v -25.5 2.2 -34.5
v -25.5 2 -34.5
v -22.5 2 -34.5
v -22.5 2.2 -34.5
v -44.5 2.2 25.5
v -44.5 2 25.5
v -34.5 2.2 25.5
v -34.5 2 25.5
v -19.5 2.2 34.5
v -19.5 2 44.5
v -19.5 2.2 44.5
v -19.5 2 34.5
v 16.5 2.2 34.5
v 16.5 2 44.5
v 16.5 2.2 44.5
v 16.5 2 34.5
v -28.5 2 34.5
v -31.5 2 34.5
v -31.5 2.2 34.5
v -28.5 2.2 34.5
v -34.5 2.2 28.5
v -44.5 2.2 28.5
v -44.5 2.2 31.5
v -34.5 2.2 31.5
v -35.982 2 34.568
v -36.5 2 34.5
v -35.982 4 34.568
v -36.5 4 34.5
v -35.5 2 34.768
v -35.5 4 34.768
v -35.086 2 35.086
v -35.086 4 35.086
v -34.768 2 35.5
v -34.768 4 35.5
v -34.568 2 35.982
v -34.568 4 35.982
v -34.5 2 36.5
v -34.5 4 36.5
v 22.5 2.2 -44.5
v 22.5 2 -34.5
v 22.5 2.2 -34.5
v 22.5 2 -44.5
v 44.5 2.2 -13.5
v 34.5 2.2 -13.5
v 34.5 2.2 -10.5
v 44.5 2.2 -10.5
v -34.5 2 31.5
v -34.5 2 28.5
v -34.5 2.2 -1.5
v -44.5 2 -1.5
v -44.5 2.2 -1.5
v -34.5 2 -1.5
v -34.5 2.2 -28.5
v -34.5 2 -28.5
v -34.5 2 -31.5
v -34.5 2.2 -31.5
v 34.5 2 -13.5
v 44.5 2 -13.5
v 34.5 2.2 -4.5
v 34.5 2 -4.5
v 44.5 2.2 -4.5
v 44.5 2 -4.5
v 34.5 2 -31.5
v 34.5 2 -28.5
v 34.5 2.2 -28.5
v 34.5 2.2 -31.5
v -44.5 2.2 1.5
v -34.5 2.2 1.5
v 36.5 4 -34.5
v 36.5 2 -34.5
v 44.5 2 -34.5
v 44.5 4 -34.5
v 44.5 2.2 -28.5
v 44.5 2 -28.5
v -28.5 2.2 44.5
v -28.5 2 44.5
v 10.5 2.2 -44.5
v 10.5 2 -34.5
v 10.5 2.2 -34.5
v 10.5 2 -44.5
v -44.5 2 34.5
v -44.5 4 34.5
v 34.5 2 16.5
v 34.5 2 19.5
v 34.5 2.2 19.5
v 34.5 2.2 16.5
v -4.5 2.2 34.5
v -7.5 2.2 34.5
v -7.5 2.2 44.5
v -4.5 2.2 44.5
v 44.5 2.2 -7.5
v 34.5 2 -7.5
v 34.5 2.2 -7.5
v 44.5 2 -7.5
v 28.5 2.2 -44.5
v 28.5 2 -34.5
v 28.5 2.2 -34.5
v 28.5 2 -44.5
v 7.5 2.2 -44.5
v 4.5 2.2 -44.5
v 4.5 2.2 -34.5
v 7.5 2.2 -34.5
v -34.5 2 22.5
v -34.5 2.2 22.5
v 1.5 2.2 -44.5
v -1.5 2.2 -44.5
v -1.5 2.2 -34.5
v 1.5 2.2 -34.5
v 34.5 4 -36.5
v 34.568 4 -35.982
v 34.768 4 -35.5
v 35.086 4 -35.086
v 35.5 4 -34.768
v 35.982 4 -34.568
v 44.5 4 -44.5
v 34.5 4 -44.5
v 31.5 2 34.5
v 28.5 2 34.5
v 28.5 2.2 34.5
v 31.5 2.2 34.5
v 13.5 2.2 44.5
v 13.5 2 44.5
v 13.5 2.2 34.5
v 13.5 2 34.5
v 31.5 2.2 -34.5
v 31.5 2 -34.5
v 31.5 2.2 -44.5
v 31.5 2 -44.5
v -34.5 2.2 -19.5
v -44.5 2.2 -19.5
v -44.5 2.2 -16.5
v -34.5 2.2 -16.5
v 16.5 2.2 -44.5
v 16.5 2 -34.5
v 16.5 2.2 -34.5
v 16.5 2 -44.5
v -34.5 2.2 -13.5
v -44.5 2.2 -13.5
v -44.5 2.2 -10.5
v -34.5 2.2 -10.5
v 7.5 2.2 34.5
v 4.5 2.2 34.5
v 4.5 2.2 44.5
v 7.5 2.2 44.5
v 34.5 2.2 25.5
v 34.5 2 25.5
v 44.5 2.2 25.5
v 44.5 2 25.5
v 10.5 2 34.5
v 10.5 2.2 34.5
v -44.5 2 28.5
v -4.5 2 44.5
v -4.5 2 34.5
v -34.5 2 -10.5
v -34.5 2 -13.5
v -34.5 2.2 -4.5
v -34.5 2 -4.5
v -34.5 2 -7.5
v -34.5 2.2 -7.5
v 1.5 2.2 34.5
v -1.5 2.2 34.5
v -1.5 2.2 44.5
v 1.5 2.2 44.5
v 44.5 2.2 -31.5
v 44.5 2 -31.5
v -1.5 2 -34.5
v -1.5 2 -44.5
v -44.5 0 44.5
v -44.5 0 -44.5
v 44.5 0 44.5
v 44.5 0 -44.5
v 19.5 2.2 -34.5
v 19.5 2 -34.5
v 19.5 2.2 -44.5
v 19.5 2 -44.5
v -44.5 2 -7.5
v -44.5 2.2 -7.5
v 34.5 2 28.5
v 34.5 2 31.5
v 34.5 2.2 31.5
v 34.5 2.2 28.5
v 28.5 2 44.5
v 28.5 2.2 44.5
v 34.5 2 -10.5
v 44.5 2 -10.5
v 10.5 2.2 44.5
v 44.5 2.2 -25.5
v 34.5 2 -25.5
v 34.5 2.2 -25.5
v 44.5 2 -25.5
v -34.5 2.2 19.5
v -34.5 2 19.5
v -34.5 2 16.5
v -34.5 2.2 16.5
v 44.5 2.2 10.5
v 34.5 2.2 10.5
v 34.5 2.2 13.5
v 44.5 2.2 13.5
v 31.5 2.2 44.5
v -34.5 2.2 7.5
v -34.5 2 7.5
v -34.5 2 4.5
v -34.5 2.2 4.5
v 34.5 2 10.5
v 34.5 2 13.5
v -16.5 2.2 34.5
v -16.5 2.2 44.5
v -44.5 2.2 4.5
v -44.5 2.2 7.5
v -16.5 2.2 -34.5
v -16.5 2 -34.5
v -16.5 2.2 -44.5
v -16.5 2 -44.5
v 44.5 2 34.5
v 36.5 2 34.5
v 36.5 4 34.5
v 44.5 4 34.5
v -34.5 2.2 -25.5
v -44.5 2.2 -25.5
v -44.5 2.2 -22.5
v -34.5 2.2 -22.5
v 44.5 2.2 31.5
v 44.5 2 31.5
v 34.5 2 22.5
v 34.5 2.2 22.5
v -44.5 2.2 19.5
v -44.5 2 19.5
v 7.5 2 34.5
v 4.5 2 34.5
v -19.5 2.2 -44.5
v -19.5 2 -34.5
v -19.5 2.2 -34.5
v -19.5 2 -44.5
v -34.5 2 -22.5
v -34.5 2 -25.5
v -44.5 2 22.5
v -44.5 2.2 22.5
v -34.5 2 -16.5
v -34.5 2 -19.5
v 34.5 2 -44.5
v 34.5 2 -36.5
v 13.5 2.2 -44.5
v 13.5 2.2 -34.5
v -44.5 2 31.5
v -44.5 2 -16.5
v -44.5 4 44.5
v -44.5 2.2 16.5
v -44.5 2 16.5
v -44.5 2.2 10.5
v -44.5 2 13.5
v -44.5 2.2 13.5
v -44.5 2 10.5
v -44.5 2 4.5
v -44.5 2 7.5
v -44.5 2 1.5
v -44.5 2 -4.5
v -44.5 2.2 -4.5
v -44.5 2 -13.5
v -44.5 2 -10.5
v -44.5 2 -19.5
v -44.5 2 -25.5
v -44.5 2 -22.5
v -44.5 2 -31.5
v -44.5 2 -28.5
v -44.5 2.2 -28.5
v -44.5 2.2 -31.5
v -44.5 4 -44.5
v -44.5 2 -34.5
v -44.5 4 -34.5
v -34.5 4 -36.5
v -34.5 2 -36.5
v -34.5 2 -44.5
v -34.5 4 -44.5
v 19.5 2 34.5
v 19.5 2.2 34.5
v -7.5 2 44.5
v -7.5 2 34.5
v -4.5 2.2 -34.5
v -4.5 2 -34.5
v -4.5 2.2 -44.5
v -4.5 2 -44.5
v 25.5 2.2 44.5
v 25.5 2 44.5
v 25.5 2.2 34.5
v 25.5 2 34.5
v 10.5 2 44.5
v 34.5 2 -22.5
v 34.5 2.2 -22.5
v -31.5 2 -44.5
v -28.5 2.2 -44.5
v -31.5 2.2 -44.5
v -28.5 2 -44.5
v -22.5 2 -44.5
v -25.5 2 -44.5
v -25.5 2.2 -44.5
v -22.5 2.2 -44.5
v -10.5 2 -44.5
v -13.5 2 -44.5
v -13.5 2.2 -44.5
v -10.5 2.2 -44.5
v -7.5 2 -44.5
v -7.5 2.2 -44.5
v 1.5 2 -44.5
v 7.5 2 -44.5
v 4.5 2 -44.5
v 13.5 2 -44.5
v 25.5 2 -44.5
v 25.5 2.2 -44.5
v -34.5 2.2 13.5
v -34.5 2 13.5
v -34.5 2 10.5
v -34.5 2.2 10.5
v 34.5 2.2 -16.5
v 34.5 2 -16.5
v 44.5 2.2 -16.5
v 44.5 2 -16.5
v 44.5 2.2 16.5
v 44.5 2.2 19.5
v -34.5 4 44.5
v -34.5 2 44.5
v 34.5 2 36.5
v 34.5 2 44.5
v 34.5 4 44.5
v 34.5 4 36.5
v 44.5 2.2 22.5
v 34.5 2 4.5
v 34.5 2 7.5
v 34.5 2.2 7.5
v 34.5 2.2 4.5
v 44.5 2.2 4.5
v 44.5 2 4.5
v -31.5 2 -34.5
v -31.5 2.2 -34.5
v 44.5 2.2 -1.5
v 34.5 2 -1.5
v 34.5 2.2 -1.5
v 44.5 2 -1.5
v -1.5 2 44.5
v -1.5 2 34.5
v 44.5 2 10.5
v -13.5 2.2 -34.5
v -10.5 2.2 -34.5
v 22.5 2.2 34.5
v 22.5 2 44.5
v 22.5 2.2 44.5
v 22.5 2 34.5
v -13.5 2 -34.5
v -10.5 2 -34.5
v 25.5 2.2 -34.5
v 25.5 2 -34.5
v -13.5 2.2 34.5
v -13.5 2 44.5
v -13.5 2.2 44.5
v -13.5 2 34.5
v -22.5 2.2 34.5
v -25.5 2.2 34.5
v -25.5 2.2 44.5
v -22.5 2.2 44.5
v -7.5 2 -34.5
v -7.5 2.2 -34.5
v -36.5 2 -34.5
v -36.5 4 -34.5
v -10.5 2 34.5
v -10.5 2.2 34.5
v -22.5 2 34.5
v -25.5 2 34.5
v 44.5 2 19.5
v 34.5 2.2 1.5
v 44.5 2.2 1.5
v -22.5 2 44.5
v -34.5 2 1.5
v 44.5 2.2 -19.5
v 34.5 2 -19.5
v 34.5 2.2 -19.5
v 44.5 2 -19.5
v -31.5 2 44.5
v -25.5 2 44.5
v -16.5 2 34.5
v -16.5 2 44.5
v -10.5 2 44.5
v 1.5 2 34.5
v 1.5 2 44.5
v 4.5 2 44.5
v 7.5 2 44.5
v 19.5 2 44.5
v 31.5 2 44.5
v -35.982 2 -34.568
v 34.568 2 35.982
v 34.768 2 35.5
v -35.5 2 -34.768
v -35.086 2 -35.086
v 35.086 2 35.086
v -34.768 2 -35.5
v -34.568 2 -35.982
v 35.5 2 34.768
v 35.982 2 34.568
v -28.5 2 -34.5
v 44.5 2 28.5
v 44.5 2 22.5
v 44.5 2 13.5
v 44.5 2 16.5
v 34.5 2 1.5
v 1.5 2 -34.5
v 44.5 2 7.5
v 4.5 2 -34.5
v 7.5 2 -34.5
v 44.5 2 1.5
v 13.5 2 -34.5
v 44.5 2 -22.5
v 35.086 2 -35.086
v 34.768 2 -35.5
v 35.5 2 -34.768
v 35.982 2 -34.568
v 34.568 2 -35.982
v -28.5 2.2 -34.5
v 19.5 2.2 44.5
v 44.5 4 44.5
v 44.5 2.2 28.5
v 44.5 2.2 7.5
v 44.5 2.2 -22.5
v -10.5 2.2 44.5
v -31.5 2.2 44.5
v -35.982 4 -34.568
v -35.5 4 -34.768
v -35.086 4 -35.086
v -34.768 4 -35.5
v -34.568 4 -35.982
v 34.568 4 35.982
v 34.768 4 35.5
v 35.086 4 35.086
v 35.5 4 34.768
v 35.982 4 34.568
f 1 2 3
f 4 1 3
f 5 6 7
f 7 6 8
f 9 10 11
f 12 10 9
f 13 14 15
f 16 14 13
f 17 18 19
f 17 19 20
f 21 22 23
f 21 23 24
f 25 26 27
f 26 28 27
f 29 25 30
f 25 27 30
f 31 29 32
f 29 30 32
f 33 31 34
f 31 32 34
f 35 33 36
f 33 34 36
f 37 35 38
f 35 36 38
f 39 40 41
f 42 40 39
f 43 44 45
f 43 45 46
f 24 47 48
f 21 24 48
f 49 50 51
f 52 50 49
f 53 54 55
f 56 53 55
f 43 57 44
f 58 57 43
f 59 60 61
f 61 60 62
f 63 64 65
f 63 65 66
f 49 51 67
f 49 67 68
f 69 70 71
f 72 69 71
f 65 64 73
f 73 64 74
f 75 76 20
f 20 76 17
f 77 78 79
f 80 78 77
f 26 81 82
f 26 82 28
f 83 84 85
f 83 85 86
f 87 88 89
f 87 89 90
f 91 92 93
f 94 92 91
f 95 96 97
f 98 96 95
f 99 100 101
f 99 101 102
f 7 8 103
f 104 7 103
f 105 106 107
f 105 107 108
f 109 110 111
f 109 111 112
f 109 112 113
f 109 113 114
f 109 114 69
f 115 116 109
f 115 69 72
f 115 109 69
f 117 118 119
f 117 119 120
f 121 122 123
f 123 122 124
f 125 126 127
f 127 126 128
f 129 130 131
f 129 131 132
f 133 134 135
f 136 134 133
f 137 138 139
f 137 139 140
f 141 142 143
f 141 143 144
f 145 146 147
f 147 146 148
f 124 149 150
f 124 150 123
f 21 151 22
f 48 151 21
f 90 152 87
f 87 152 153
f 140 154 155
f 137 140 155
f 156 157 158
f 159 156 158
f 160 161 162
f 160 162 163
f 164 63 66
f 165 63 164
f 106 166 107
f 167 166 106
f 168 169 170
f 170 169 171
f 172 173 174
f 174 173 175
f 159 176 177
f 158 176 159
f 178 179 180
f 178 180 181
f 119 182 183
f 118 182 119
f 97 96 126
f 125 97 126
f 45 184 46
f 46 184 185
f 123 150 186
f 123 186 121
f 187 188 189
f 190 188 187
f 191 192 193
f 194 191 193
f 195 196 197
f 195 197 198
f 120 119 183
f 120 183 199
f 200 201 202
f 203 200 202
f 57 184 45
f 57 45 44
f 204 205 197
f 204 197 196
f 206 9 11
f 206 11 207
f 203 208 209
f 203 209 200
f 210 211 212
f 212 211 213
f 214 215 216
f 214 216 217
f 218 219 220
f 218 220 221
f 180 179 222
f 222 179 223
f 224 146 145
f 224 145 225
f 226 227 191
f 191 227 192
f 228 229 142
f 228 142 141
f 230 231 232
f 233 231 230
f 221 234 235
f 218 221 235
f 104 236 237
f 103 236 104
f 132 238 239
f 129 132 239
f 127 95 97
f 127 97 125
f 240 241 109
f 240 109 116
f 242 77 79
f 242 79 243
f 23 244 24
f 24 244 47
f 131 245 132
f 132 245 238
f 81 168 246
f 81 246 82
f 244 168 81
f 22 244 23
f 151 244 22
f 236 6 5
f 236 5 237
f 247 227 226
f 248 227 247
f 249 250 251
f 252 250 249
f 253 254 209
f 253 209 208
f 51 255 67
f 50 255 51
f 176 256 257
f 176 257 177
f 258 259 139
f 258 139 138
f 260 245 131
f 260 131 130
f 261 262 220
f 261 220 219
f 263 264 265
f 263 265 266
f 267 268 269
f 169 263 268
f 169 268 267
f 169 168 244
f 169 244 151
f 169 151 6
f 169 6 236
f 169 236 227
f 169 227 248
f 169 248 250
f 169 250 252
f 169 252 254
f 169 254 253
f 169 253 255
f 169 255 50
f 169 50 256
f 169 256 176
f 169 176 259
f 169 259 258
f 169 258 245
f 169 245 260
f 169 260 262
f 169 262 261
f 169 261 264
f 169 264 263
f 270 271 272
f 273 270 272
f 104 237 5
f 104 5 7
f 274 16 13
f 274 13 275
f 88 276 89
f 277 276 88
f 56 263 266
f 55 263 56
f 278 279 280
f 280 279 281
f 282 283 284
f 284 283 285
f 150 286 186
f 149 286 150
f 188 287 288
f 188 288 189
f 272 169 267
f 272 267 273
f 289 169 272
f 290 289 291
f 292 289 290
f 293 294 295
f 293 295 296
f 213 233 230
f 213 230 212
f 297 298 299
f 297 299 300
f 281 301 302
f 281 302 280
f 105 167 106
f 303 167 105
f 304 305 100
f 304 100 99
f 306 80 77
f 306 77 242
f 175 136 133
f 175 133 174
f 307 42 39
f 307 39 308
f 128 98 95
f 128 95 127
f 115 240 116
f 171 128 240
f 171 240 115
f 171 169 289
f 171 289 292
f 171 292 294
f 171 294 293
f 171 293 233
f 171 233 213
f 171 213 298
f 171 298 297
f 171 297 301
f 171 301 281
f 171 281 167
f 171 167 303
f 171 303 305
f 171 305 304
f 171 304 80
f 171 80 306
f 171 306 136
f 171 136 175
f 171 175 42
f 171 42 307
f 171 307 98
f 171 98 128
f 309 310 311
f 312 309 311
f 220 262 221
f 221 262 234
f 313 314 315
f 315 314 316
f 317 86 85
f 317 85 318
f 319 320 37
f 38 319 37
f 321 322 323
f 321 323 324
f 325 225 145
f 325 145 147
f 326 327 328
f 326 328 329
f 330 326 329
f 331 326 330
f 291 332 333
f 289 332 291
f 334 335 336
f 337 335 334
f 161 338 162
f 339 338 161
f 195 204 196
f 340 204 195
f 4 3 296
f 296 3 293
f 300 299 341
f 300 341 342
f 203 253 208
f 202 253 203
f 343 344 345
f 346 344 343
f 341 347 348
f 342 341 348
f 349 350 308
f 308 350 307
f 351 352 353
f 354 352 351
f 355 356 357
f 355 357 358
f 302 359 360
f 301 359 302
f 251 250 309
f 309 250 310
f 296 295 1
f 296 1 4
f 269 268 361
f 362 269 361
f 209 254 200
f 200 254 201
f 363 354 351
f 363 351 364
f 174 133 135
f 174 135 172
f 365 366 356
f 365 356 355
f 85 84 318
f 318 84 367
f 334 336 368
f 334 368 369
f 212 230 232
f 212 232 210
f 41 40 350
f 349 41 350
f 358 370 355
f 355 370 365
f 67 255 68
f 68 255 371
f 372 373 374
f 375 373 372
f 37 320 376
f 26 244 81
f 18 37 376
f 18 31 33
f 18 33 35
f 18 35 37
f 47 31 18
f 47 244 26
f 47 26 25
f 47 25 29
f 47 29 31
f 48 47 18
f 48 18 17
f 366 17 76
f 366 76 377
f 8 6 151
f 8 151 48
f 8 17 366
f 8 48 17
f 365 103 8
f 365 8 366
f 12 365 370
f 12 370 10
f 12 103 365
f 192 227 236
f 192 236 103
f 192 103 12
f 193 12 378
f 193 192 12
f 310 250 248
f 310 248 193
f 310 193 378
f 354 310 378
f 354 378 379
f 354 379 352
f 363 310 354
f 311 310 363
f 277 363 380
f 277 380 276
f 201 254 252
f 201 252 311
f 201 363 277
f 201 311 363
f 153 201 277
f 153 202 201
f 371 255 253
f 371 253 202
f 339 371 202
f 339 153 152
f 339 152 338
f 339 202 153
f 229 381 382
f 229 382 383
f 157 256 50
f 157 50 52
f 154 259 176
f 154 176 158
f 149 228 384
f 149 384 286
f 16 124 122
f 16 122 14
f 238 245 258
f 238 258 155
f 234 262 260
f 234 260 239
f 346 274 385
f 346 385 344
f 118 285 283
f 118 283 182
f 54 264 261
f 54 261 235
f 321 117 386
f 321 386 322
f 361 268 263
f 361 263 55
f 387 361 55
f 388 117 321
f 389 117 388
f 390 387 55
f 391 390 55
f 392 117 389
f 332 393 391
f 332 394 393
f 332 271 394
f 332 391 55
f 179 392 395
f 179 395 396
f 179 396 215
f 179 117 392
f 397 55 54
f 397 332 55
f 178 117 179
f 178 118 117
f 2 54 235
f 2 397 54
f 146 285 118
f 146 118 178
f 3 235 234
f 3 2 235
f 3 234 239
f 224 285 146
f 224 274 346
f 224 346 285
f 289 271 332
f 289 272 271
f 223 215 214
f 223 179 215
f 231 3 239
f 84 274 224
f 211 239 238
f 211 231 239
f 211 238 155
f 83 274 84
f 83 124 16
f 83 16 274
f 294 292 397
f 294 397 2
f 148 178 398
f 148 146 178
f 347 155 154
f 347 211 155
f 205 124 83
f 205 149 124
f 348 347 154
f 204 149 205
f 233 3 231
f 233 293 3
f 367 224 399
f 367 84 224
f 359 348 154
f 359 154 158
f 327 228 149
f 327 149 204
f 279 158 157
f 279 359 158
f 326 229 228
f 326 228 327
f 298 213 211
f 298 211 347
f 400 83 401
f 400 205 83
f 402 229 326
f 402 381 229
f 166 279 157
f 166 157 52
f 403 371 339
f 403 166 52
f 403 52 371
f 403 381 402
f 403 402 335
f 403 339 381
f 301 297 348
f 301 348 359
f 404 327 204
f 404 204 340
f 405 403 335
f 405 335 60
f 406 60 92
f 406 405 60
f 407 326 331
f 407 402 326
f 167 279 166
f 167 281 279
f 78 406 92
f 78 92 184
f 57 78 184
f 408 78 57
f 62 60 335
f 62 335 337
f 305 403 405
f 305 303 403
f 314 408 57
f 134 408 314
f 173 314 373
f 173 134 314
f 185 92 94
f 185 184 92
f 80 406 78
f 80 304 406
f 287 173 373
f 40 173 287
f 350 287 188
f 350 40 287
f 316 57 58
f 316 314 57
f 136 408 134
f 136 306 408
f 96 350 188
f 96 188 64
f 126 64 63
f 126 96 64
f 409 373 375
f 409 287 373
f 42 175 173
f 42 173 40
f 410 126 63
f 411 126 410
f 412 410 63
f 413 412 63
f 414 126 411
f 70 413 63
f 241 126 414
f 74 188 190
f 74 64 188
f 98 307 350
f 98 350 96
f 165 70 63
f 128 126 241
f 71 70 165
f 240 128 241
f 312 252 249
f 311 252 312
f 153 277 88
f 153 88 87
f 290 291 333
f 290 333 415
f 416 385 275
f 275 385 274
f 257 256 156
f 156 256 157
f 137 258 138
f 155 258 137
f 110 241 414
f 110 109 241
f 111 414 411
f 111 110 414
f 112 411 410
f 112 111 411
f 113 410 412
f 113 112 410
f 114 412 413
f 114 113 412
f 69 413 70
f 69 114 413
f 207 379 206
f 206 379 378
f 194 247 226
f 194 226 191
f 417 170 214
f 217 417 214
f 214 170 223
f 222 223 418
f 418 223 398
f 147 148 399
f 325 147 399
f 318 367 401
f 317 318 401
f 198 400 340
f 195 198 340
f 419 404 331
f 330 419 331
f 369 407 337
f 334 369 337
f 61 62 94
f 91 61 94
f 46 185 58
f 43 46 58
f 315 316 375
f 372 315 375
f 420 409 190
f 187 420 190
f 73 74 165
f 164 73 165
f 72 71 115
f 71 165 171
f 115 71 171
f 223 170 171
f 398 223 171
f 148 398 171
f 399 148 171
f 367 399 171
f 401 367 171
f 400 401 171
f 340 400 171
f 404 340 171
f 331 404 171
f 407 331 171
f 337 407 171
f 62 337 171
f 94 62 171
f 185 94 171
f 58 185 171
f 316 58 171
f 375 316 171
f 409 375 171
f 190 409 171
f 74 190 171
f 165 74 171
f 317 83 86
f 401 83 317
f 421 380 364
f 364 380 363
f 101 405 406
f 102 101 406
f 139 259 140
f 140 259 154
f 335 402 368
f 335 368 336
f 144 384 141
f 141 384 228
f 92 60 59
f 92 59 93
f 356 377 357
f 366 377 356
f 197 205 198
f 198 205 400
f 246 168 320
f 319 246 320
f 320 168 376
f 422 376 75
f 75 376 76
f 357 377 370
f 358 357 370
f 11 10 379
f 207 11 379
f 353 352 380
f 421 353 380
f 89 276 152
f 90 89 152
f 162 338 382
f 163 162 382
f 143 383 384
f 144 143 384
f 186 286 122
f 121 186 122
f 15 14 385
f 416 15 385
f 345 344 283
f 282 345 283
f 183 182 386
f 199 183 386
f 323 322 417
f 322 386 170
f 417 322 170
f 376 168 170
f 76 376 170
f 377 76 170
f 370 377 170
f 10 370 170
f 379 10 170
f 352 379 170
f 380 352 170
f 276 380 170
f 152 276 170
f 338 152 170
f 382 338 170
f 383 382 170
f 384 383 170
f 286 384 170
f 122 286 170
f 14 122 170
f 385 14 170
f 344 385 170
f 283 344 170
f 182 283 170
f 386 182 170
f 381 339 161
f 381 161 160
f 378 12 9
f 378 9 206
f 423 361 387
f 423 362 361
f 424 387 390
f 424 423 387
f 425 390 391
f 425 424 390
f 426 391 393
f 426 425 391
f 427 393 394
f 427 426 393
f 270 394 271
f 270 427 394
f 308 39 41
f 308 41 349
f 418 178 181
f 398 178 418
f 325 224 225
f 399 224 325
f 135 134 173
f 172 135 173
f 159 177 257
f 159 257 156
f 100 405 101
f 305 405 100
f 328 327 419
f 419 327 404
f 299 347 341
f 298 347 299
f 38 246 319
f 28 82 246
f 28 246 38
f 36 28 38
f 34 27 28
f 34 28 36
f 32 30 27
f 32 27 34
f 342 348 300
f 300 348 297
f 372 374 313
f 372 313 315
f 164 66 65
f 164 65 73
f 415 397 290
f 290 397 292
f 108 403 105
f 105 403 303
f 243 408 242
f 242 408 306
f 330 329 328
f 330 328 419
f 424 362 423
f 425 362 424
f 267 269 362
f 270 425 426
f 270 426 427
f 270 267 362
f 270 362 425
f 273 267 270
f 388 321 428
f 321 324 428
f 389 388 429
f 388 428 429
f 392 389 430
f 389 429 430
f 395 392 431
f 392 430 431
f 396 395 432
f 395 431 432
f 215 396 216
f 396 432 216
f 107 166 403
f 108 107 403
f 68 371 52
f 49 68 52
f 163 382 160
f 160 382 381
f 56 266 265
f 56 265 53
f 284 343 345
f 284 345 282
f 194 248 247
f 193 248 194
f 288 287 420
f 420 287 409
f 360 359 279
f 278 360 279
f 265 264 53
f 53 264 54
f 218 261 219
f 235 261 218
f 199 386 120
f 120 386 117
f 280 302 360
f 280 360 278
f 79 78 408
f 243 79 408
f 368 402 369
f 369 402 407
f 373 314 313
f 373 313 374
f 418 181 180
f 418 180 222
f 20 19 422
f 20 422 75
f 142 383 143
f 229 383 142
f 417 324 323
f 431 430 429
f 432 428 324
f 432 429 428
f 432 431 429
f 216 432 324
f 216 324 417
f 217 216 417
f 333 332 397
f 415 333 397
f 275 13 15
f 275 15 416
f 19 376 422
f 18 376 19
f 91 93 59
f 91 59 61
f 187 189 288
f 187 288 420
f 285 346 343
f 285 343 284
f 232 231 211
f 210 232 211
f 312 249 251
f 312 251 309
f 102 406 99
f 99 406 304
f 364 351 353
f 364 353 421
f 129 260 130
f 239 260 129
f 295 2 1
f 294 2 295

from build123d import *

# Parameters (mm, degrees)
SKETCH1_W           = 89
SKETCH1_H           = 89
BOSS_EXTRUDE1_DEPTH = 2
SKETCH2_W           = 10
SKETCH2_H           = 10
BOSS_EXTRUDE2_DEPTH = 2
SKETCH3_W           = 10
SKETCH3_H           = 3
SKETCH3_W_2         = 3
SKETCH3_H_2         = 10
BOSS_EXTRUDE3_DEPTH = 0.2
FILLET1_R           = 2


with BuildPart() as part:
    # Sketch1 → Boss-Extrude1 (new body)
    with BuildSketch(Plane(origin=(0, 0, 0), x_dir=(1, 0, 0), z_dir=(0, 1, 0))):
        Rectangle(SKETCH1_W, SKETCH1_H)
    extrude(amount=BOSS_EXTRUDE1_DEPTH)

    # Sketch2 → Boss-Extrude2 (add)
    with BuildSketch(Plane(origin=(0, 2, 0), x_dir=(1, 0, 0), z_dir=(0, 1, 0))):
        with Locations((-39.5, 39.5)):
            Rectangle(SKETCH2_W, SKETCH2_H)
        with Locations((39.5, 39.5)):
            Rectangle(SKETCH2_W, SKETCH2_H)
        with Locations((39.5, -39.5)):
            Rectangle(SKETCH2_W, SKETCH2_H)
        with Locations((-39.5, -39.5)):
            Rectangle(SKETCH2_W, SKETCH2_H)
    extrude(amount=BOSS_EXTRUDE2_DEPTH)

    # Sketch3 → Boss-Extrude3 (add)
    with BuildSketch(Plane(origin=(0, 2, 0), x_dir=(1, 0, 0), z_dir=(0, 1, 0))):
        with Locations((-39.5, 30)):
            Rectangle(SKETCH3_W, SKETCH3_H)
        with Locations((-30, 39.5)):
            Rectangle(SKETCH3_W_2, SKETCH3_H_2)
        with Locations((-39.5, 24)):
            Rectangle(SKETCH3_W, SKETCH3_H)
        with Locations((-24, 39.5)):
            Rectangle(SKETCH3_W_2, SKETCH3_H_2)
        with Locations((-39.5, 18)):
            Rectangle(SKETCH3_W, SKETCH3_H)
        with Locations((-18, 39.5)):
            Rectangle(SKETCH3_W_2, SKETCH3_H_2)
        with Locations((-39.5, 12)):
            Rectangle(SKETCH3_W, SKETCH3_H)
        with Locations((-12, 39.5)):
            Rectangle(SKETCH3_W_2, SKETCH3_H_2)
        with Locations((-39.5, 6)):
            Rectangle(SKETCH3_W, SKETCH3_H)
        with Locations((-6, 39.5)):
            Rectangle(SKETCH3_W_2, SKETCH3_H_2)
        with Locations((-39.5, 0)):
            Rectangle(SKETCH3_W, SKETCH3_H)
        with Locations((0, 39.5)):
            Rectangle(SKETCH3_W_2, SKETCH3_H_2)
        with Locations((-39.5, -6)):
            Rectangle(SKETCH3_W, SKETCH3_H)
        with Locations((6, 39.5)):
            Rectangle(SKETCH3_W_2, SKETCH3_H_2)
        with Locations((-39.5, -12)):
            Rectangle(SKETCH3_W, SKETCH3_H)
        with Locations((12, 39.5)):
            Rectangle(SKETCH3_W_2, SKETCH3_H_2)
        with Locations((-39.5, -18)):
            Rectangle(SKETCH3_W, SKETCH3_H)
        with Locations((18, 39.5)):
            Rectangle(SKETCH3_W_2, SKETCH3_H_2)
        with Locations((-39.5, -24)):
            Rectangle(SKETCH3_W, SKETCH3_H)
        with Locations((24, 39.5)):
            Rectangle(SKETCH3_W_2, SKETCH3_H_2)
        with Locations((-39.5, -30)):
            Rectangle(SKETCH3_W, SKETCH3_H)
        with Locations((30, 39.5)):
            Rectangle(SKETCH3_W_2, SKETCH3_H_2)
        with Locations((-30, -39.5)):
            Rectangle(SKETCH3_W_2, SKETCH3_H_2)
        with Locations((39.5, 30)):
            Rectangle(SKETCH3_W, SKETCH3_H)
        with Locations((-24, -39.5)):
            Rectangle(SKETCH3_W_2, SKETCH3_H_2)
        with Locations((39.5, 24)):
            Rectangle(SKETCH3_W, SKETCH3_H)
        with Locations((-18, -39.5)):
            Rectangle(SKETCH3_W_2, SKETCH3_H_2)
        with Locations((39.5, 18)):
            Rectangle(SKETCH3_W, SKETCH3_H)
        with Locations((-12, -39.5)):
            Rectangle(SKETCH3_W_2, SKETCH3_H_2)
        with Locations((39.5, 12)):
            Rectangle(SKETCH3_W, SKETCH3_H)
        with Locations((-6, -39.5)):
            Rectangle(SKETCH3_W_2, SKETCH3_H_2)
        with Locations((39.5, 6)):
            Rectangle(SKETCH3_W, SKETCH3_H)
        with Locations((0, -39.5)):
            Rectangle(SKETCH3_W_2, SKETCH3_H_2)
        with Locations((39.5, 0)):
            Rectangle(SKETCH3_W, SKETCH3_H)
        with Locations((6, -39.5)):
            Rectangle(SKETCH3_W_2, SKETCH3_H_2)
        with Locations((39.5, -6)):
            Rectangle(SKETCH3_W, SKETCH3_H)
        with Locations((12, -39.5)):
            Rectangle(SKETCH3_W_2, SKETCH3_H_2)
        with Locations((39.5, -12)):
            Rectangle(SKETCH3_W, SKETCH3_H)
        with Locations((18, -39.5)):
            Rectangle(SKETCH3_W_2, SKETCH3_H_2)
        with Locations((39.5, -18)):
            Rectangle(SKETCH3_W, SKETCH3_H)
        with Locations((24, -39.5)):
            Rectangle(SKETCH3_W_2, SKETCH3_H_2)
        with Locations((39.5, -24)):
            Rectangle(SKETCH3_W, SKETCH3_H)
        with Locations((30, -39.5)):
            Rectangle(SKETCH3_W_2, SKETCH3_H_2)
        with Locations((39.5, -30)):
            Rectangle(SKETCH3_W, SKETCH3_H)
    extrude(amount=BOSS_EXTRUDE3_DEPTH)

    # Fillet1
    fillet1_edges = [part.edges().sort_by_distance(p)[0] for p in [
        (-34.5, 3, -34.5),
        (34.5, 3, -34.5),
        (34.5, 3, 34.5),
        (-34.5, 3, 34.5),
    ]]
    fillet(fillet1_edges, radius=FILLET1_R)


solid = part.part
